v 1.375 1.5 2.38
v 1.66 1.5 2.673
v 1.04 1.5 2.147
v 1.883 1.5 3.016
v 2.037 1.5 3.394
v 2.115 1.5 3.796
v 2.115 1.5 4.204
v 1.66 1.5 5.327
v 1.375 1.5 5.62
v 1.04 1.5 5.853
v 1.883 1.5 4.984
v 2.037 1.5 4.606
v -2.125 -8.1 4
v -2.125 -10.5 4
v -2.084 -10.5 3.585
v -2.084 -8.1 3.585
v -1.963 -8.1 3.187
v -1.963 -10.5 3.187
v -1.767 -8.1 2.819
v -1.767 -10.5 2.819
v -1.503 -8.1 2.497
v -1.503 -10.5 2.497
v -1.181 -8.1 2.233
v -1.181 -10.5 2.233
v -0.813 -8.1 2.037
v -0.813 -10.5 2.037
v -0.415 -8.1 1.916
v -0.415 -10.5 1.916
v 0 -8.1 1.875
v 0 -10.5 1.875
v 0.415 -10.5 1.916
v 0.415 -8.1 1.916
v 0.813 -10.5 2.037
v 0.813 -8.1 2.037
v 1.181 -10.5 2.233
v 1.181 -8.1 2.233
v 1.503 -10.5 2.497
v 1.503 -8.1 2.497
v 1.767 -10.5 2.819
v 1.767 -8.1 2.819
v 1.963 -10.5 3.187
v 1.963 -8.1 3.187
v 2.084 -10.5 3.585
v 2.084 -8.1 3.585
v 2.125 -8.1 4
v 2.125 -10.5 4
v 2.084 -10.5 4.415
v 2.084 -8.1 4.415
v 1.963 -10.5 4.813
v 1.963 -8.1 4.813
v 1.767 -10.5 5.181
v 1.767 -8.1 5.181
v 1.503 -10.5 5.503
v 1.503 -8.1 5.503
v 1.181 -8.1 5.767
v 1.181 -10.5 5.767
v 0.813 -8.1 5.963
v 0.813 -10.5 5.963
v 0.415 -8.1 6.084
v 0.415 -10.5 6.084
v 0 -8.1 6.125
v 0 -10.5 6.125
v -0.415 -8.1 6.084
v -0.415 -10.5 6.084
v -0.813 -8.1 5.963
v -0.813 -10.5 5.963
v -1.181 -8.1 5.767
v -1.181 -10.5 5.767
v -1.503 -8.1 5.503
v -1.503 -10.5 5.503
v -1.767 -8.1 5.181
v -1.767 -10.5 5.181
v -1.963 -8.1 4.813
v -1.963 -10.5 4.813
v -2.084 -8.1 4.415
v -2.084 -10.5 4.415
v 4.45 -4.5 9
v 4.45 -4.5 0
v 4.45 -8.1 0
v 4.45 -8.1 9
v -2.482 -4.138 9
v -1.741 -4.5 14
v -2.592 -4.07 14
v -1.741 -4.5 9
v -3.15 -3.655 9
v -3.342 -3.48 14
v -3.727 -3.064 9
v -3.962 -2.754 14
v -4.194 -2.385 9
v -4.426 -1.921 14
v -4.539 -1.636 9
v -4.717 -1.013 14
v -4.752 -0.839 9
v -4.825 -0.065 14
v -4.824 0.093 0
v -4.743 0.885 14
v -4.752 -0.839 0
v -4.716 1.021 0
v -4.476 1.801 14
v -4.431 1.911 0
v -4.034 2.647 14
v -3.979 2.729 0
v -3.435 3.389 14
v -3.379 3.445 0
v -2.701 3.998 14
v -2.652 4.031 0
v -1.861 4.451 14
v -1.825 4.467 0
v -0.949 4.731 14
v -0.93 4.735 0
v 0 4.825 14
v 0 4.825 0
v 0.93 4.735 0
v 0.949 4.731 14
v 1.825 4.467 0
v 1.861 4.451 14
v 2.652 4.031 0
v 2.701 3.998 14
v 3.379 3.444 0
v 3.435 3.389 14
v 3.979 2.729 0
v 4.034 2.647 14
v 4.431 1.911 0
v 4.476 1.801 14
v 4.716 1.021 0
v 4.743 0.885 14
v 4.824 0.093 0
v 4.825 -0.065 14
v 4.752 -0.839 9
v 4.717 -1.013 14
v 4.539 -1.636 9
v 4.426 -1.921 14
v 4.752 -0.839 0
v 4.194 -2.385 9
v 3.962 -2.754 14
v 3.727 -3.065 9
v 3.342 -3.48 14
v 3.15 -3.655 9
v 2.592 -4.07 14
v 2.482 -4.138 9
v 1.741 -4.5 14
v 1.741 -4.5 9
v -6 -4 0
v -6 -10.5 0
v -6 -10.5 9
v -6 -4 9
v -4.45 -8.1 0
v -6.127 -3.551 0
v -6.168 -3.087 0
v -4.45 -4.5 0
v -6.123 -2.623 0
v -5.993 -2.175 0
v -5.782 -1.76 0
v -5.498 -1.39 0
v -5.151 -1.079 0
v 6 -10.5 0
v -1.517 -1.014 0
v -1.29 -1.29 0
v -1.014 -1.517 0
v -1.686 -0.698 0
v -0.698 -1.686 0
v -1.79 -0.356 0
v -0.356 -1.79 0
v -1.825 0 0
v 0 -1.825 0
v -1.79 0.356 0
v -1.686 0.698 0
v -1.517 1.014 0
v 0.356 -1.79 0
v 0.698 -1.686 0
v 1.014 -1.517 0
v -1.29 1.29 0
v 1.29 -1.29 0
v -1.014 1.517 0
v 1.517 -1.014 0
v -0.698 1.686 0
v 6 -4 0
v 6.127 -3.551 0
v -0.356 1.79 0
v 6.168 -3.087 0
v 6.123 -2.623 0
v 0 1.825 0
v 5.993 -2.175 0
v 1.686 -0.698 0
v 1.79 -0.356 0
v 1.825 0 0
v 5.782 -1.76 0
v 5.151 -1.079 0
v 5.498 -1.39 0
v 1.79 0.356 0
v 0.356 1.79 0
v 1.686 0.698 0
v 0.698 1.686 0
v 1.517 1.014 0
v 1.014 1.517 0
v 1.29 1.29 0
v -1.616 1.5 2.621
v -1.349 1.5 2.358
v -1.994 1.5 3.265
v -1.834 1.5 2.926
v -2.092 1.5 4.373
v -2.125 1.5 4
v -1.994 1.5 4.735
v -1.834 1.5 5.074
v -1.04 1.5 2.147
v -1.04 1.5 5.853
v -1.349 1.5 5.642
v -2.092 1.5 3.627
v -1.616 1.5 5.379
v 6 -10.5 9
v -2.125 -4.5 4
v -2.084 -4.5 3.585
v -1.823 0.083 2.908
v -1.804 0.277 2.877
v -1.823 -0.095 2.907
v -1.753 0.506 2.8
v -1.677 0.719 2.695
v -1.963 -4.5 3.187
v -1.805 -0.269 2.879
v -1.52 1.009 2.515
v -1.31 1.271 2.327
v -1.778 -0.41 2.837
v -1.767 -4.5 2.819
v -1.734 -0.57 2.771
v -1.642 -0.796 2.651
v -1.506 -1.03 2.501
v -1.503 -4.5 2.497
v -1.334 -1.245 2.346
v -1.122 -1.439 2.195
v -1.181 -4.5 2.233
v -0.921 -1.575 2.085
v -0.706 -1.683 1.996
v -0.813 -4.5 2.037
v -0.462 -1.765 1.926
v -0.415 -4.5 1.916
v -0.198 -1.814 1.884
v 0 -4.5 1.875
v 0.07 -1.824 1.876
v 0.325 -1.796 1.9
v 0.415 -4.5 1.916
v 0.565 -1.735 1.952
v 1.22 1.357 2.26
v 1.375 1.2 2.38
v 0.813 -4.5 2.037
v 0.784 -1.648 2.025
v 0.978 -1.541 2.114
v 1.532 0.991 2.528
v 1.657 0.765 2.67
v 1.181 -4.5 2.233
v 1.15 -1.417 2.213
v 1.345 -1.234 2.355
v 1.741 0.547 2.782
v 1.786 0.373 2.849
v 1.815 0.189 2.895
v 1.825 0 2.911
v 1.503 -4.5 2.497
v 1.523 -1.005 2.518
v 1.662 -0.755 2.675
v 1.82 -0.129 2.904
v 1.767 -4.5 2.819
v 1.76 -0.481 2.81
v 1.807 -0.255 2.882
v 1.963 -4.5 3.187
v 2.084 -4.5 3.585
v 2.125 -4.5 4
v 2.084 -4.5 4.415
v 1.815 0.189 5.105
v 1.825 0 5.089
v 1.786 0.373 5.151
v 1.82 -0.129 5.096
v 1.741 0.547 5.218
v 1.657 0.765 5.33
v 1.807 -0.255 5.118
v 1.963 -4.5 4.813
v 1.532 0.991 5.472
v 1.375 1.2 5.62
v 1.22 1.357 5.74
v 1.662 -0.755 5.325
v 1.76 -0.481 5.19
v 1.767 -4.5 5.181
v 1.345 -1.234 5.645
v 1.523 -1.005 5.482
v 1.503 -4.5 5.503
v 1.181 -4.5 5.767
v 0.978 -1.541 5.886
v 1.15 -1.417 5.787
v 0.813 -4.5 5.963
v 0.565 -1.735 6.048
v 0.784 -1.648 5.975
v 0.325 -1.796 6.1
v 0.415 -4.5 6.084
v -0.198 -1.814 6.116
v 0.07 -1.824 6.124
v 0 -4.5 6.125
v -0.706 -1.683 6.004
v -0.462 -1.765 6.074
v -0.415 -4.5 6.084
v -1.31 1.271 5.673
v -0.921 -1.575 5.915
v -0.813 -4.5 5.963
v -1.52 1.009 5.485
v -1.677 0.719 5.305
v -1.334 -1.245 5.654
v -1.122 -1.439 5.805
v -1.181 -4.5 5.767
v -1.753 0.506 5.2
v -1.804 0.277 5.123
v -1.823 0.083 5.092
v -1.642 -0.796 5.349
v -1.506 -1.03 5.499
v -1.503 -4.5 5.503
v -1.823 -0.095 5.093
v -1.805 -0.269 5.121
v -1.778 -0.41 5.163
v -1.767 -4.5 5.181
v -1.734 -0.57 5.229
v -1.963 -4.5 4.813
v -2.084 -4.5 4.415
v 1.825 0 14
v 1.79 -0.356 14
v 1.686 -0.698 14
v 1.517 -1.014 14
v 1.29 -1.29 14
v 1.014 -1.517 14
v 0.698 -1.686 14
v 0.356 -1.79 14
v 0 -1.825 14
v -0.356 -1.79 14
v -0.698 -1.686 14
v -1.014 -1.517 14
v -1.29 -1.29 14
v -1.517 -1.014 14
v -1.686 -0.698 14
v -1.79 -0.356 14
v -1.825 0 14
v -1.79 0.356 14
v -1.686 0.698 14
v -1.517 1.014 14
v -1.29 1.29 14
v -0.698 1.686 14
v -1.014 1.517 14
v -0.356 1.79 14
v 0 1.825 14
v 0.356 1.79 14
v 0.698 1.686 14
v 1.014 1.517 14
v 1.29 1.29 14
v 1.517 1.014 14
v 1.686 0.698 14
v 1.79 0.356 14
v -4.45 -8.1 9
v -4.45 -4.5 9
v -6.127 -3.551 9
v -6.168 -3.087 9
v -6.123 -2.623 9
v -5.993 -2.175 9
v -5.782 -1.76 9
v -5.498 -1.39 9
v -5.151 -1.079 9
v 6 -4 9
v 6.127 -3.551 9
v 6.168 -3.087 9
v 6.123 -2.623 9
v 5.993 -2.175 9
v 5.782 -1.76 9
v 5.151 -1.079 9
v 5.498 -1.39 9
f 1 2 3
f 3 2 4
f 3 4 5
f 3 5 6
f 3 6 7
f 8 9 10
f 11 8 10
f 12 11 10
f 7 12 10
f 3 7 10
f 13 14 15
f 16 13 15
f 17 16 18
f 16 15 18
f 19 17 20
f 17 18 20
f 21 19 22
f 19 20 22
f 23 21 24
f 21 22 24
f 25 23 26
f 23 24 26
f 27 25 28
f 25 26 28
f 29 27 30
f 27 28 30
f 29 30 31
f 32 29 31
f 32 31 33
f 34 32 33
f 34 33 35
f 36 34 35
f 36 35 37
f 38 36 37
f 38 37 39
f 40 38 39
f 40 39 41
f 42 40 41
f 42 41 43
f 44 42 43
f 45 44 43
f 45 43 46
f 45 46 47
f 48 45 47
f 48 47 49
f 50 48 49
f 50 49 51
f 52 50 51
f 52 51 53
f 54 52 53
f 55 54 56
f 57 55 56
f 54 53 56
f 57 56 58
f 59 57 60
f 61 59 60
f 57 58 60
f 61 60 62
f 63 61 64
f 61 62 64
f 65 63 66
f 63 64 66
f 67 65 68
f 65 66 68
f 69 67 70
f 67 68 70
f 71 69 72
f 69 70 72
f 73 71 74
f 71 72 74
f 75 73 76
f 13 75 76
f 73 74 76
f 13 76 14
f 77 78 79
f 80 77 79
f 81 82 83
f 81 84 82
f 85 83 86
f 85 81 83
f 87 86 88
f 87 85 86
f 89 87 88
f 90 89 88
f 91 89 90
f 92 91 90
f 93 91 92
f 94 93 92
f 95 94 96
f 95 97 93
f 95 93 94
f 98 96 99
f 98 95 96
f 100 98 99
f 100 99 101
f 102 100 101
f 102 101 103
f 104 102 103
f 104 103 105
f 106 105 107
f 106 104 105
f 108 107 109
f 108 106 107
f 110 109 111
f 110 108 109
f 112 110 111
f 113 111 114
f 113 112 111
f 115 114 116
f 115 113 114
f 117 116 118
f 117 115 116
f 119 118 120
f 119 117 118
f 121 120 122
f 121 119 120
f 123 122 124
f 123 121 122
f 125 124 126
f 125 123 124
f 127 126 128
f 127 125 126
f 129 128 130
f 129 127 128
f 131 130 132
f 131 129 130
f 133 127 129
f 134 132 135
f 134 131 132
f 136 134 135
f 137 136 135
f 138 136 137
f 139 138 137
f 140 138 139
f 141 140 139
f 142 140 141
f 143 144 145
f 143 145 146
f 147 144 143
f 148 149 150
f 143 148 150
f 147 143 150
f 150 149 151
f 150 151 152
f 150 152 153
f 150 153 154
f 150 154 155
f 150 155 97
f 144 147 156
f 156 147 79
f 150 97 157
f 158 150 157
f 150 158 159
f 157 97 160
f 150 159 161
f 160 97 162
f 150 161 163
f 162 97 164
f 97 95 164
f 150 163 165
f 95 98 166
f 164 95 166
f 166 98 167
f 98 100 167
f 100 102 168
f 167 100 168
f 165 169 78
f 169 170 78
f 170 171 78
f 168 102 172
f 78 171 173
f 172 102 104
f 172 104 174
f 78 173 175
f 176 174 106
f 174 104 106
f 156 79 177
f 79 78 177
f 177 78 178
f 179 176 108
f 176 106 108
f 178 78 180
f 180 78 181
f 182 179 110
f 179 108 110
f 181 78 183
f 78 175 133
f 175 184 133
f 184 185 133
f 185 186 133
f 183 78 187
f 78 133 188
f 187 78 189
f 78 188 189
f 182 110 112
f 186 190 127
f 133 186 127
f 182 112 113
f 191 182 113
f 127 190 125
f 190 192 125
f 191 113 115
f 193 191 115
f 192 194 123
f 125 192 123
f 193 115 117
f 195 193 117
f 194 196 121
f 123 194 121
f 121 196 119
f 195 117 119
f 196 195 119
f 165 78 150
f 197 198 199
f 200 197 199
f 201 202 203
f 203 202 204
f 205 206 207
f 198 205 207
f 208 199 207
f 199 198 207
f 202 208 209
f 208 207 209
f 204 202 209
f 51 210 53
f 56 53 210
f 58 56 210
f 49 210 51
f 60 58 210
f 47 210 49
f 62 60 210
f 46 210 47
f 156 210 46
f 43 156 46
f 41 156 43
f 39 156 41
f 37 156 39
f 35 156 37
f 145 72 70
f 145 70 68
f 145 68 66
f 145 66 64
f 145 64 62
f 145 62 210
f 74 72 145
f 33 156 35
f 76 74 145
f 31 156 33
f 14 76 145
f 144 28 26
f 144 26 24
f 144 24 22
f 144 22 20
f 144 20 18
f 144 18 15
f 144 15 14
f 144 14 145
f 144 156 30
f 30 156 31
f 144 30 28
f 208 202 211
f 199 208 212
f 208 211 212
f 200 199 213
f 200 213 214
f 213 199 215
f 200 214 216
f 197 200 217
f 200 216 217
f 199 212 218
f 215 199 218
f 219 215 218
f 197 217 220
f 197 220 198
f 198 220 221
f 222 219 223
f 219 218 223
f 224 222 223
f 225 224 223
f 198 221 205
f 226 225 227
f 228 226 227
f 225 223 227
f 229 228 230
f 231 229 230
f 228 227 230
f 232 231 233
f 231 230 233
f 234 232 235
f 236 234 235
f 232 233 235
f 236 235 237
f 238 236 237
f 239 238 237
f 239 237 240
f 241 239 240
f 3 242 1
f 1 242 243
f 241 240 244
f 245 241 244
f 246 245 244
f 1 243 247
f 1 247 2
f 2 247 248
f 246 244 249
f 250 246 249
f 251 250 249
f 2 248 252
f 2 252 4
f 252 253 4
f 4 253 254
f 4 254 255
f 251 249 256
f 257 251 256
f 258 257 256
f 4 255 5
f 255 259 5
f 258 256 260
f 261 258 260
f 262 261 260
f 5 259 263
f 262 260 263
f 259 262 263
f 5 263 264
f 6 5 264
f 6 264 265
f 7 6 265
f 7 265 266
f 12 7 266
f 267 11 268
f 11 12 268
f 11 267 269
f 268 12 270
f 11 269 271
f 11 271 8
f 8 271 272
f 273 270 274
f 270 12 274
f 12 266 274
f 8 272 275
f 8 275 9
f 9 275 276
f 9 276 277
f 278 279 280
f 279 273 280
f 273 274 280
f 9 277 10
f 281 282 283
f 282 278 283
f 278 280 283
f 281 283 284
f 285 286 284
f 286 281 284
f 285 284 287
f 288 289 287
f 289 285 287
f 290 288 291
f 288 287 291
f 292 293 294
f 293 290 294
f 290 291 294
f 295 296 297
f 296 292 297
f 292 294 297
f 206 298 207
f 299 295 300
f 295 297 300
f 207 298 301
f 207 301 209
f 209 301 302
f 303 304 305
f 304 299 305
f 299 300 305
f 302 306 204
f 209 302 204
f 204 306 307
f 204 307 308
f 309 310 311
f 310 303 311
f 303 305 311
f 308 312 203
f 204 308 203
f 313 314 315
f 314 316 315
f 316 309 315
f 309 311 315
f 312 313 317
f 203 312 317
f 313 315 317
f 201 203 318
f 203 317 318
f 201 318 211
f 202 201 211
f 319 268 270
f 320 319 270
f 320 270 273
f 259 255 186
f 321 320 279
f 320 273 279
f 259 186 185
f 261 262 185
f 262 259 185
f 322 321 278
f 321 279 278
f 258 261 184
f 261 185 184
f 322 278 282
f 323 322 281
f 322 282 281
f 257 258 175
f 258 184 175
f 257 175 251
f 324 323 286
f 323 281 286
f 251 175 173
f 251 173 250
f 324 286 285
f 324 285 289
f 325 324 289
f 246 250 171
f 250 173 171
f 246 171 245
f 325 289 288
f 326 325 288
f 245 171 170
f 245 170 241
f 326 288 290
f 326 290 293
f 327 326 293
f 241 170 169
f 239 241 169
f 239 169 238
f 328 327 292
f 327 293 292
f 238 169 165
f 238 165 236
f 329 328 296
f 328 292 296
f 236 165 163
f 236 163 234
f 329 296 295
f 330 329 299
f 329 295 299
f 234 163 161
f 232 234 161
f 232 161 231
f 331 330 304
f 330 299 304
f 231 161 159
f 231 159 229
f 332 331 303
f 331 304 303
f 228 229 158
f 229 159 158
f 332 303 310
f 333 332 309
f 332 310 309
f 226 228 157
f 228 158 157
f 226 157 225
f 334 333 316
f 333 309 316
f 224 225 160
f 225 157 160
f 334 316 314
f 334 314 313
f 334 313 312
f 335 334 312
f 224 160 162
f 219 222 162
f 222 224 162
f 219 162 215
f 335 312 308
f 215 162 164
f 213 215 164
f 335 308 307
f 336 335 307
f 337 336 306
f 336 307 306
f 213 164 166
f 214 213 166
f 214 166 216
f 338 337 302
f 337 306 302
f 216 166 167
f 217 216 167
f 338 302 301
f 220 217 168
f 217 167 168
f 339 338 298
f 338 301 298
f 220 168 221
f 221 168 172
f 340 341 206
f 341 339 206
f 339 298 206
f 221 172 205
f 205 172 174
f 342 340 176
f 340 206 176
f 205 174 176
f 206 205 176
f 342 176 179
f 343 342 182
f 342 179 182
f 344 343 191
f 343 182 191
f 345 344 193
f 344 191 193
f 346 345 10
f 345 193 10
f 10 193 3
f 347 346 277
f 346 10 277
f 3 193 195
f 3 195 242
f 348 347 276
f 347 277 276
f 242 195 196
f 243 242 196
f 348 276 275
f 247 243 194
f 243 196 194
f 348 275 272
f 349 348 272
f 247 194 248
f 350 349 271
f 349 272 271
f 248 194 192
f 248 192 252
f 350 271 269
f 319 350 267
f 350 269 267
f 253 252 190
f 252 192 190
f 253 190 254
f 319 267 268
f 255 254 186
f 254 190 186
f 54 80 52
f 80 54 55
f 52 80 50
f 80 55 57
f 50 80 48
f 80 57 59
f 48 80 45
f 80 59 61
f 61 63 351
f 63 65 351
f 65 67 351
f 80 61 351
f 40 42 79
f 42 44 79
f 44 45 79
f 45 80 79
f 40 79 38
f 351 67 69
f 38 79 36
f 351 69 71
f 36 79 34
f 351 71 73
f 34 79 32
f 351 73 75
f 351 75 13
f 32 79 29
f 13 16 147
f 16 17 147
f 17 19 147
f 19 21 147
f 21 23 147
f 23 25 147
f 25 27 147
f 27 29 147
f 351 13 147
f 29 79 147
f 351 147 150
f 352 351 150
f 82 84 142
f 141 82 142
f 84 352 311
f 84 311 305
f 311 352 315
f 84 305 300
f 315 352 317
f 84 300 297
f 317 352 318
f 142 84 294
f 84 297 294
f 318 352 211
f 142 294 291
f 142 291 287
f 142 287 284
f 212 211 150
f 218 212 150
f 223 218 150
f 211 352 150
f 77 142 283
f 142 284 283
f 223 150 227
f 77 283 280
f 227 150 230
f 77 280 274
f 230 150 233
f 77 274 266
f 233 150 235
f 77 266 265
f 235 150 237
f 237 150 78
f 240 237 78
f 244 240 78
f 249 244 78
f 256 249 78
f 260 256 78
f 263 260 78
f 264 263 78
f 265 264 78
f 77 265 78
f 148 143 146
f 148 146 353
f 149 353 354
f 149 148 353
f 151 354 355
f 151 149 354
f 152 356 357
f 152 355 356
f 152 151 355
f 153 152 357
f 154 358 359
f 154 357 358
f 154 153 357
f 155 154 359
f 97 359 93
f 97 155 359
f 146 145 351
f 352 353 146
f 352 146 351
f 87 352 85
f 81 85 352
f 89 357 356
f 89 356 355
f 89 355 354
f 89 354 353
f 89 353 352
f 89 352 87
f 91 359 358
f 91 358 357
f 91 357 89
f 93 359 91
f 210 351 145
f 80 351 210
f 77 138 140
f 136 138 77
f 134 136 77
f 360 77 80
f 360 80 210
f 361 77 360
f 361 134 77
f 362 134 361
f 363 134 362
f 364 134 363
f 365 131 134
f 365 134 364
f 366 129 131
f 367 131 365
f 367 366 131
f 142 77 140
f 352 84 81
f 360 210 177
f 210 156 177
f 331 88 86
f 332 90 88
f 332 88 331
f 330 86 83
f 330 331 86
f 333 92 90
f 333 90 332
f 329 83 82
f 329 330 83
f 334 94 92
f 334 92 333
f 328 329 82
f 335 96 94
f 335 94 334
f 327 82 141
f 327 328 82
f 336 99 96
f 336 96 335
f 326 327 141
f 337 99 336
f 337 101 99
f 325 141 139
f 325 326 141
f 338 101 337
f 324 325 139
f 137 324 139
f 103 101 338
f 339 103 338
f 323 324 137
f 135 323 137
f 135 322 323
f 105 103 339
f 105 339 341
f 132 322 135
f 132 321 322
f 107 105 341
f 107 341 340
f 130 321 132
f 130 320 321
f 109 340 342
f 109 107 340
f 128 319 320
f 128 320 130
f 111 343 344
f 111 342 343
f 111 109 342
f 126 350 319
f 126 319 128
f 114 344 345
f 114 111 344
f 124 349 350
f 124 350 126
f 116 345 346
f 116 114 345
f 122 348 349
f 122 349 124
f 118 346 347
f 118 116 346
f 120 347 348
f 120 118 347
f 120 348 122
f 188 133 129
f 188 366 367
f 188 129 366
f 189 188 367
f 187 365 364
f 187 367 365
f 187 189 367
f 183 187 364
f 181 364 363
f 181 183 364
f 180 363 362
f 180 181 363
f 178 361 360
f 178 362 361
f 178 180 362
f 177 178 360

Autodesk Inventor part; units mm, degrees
ref_plane "YZ Plane" through (0, 0, 0) normal (1, 0, 0) x (0, 1, 0)
ref_plane "XY Plane" through (0, 0, 0) normal (0, 0, 1) x (1, 0, 0)
sketch "Sketch1" plane through (0, 0, 0) normal (0, 0, 1) x (1, 0, 0)
  circle A0 centre (0, 0) radius 1.825
  circle A1 centre (0, 0) radius 4.825
  line L0 (-6, -4) -> (6, -4)
  line L1 (6, -10.5) -> (-6, -10.5)
  line L2 (-6, -10.5) -> (-6, -4)
  arc A2 (-2.3662, -0.949) -> (-6, -4) centre (-3.6609, -3.0965) ccw
  arc A3 (6, -4) -> (2.3662, -0.949) centre (3.6609, -3.0965) ccw
  arc A4 (-2.3662, -0.949) -> (2.3662, -0.949) centre (0, 0.4878) ccw
  line L3 (-15.4666, 0) -> (16.043, 0) construction
  line L4 (0, 8.2762) -> (0, -10.4238) construction
  line L5 (6, -10.5) -> (6, -4)
  dimension "d0" = 3.65
  dimension "d1" = 3
  dimension "d3" = 12
  dimension "d5" = 4
  dimension "d6" = 6.5
  dimension "d7" = 6
extrude "Extrusion1" add sketch "Sketch1" along normal blind 9
ref_plane "Work Plane1" through (0, -10.5, 0) normal (0, 1, 0) x (-1, 0, 0)
extrude "Extrusion4" add sketch "Sketch1" along normal blind 14 contours A1 A3 A4 A2 | A2 A4 A3 A1 L0 | L0 A1
sketch "Sketch2" plane through (0, -10.5, 0) normal (0, 1, 0) x (-1, 0, 0)
  line L0 (6, 0) -> (-6, 0) projected
  line L1 (-6, 0) -> (-6, 9) projected
  line L2 (6, 9) -> (-6, 9) projected
  line L3 (6, 0) -> (6, 9) projected
  circle A0 centre (0, 4) radius 2.125
  point P0 (0, 0)
  dimension "d11" = 4.25
  dimension "d12" = 4
extrude "Extrusion2" cut sketch "Sketch2" along normal blind 12 contours A0
sketch "Sketch3" plane through (0, 0, 9) normal (0, 0, 1) x (1, 0, 0)
  line L0 (-6, -10.5) -> (6, -10.5) projected
  circle A0 centre (0, 0) radius 1.825 projected
  line L1 (-4.45, -4.5) -> (4.45, -4.5)
  line L2 (4.45, -4.5) -> (4.45, -8.1)
  line L3 (4.45, -8.1) -> (-4.45, -8.1)
  line L4 (-4.45, -8.1) -> (-4.45, -4.5)
  point P0 (0, -8.1)
  point P1 (0, -10.5)
  dimension "d15" = 8.9
  dimension "d16" = 3.6
  dimension "d17" = 4.5
extrude "Extrusion3" cut sketch "Sketch3" along normal mid plane 30 contours L1 L2 L3 L4
equation "\"d4\" = 0.4"
properties part number "MotorAttachment2"
